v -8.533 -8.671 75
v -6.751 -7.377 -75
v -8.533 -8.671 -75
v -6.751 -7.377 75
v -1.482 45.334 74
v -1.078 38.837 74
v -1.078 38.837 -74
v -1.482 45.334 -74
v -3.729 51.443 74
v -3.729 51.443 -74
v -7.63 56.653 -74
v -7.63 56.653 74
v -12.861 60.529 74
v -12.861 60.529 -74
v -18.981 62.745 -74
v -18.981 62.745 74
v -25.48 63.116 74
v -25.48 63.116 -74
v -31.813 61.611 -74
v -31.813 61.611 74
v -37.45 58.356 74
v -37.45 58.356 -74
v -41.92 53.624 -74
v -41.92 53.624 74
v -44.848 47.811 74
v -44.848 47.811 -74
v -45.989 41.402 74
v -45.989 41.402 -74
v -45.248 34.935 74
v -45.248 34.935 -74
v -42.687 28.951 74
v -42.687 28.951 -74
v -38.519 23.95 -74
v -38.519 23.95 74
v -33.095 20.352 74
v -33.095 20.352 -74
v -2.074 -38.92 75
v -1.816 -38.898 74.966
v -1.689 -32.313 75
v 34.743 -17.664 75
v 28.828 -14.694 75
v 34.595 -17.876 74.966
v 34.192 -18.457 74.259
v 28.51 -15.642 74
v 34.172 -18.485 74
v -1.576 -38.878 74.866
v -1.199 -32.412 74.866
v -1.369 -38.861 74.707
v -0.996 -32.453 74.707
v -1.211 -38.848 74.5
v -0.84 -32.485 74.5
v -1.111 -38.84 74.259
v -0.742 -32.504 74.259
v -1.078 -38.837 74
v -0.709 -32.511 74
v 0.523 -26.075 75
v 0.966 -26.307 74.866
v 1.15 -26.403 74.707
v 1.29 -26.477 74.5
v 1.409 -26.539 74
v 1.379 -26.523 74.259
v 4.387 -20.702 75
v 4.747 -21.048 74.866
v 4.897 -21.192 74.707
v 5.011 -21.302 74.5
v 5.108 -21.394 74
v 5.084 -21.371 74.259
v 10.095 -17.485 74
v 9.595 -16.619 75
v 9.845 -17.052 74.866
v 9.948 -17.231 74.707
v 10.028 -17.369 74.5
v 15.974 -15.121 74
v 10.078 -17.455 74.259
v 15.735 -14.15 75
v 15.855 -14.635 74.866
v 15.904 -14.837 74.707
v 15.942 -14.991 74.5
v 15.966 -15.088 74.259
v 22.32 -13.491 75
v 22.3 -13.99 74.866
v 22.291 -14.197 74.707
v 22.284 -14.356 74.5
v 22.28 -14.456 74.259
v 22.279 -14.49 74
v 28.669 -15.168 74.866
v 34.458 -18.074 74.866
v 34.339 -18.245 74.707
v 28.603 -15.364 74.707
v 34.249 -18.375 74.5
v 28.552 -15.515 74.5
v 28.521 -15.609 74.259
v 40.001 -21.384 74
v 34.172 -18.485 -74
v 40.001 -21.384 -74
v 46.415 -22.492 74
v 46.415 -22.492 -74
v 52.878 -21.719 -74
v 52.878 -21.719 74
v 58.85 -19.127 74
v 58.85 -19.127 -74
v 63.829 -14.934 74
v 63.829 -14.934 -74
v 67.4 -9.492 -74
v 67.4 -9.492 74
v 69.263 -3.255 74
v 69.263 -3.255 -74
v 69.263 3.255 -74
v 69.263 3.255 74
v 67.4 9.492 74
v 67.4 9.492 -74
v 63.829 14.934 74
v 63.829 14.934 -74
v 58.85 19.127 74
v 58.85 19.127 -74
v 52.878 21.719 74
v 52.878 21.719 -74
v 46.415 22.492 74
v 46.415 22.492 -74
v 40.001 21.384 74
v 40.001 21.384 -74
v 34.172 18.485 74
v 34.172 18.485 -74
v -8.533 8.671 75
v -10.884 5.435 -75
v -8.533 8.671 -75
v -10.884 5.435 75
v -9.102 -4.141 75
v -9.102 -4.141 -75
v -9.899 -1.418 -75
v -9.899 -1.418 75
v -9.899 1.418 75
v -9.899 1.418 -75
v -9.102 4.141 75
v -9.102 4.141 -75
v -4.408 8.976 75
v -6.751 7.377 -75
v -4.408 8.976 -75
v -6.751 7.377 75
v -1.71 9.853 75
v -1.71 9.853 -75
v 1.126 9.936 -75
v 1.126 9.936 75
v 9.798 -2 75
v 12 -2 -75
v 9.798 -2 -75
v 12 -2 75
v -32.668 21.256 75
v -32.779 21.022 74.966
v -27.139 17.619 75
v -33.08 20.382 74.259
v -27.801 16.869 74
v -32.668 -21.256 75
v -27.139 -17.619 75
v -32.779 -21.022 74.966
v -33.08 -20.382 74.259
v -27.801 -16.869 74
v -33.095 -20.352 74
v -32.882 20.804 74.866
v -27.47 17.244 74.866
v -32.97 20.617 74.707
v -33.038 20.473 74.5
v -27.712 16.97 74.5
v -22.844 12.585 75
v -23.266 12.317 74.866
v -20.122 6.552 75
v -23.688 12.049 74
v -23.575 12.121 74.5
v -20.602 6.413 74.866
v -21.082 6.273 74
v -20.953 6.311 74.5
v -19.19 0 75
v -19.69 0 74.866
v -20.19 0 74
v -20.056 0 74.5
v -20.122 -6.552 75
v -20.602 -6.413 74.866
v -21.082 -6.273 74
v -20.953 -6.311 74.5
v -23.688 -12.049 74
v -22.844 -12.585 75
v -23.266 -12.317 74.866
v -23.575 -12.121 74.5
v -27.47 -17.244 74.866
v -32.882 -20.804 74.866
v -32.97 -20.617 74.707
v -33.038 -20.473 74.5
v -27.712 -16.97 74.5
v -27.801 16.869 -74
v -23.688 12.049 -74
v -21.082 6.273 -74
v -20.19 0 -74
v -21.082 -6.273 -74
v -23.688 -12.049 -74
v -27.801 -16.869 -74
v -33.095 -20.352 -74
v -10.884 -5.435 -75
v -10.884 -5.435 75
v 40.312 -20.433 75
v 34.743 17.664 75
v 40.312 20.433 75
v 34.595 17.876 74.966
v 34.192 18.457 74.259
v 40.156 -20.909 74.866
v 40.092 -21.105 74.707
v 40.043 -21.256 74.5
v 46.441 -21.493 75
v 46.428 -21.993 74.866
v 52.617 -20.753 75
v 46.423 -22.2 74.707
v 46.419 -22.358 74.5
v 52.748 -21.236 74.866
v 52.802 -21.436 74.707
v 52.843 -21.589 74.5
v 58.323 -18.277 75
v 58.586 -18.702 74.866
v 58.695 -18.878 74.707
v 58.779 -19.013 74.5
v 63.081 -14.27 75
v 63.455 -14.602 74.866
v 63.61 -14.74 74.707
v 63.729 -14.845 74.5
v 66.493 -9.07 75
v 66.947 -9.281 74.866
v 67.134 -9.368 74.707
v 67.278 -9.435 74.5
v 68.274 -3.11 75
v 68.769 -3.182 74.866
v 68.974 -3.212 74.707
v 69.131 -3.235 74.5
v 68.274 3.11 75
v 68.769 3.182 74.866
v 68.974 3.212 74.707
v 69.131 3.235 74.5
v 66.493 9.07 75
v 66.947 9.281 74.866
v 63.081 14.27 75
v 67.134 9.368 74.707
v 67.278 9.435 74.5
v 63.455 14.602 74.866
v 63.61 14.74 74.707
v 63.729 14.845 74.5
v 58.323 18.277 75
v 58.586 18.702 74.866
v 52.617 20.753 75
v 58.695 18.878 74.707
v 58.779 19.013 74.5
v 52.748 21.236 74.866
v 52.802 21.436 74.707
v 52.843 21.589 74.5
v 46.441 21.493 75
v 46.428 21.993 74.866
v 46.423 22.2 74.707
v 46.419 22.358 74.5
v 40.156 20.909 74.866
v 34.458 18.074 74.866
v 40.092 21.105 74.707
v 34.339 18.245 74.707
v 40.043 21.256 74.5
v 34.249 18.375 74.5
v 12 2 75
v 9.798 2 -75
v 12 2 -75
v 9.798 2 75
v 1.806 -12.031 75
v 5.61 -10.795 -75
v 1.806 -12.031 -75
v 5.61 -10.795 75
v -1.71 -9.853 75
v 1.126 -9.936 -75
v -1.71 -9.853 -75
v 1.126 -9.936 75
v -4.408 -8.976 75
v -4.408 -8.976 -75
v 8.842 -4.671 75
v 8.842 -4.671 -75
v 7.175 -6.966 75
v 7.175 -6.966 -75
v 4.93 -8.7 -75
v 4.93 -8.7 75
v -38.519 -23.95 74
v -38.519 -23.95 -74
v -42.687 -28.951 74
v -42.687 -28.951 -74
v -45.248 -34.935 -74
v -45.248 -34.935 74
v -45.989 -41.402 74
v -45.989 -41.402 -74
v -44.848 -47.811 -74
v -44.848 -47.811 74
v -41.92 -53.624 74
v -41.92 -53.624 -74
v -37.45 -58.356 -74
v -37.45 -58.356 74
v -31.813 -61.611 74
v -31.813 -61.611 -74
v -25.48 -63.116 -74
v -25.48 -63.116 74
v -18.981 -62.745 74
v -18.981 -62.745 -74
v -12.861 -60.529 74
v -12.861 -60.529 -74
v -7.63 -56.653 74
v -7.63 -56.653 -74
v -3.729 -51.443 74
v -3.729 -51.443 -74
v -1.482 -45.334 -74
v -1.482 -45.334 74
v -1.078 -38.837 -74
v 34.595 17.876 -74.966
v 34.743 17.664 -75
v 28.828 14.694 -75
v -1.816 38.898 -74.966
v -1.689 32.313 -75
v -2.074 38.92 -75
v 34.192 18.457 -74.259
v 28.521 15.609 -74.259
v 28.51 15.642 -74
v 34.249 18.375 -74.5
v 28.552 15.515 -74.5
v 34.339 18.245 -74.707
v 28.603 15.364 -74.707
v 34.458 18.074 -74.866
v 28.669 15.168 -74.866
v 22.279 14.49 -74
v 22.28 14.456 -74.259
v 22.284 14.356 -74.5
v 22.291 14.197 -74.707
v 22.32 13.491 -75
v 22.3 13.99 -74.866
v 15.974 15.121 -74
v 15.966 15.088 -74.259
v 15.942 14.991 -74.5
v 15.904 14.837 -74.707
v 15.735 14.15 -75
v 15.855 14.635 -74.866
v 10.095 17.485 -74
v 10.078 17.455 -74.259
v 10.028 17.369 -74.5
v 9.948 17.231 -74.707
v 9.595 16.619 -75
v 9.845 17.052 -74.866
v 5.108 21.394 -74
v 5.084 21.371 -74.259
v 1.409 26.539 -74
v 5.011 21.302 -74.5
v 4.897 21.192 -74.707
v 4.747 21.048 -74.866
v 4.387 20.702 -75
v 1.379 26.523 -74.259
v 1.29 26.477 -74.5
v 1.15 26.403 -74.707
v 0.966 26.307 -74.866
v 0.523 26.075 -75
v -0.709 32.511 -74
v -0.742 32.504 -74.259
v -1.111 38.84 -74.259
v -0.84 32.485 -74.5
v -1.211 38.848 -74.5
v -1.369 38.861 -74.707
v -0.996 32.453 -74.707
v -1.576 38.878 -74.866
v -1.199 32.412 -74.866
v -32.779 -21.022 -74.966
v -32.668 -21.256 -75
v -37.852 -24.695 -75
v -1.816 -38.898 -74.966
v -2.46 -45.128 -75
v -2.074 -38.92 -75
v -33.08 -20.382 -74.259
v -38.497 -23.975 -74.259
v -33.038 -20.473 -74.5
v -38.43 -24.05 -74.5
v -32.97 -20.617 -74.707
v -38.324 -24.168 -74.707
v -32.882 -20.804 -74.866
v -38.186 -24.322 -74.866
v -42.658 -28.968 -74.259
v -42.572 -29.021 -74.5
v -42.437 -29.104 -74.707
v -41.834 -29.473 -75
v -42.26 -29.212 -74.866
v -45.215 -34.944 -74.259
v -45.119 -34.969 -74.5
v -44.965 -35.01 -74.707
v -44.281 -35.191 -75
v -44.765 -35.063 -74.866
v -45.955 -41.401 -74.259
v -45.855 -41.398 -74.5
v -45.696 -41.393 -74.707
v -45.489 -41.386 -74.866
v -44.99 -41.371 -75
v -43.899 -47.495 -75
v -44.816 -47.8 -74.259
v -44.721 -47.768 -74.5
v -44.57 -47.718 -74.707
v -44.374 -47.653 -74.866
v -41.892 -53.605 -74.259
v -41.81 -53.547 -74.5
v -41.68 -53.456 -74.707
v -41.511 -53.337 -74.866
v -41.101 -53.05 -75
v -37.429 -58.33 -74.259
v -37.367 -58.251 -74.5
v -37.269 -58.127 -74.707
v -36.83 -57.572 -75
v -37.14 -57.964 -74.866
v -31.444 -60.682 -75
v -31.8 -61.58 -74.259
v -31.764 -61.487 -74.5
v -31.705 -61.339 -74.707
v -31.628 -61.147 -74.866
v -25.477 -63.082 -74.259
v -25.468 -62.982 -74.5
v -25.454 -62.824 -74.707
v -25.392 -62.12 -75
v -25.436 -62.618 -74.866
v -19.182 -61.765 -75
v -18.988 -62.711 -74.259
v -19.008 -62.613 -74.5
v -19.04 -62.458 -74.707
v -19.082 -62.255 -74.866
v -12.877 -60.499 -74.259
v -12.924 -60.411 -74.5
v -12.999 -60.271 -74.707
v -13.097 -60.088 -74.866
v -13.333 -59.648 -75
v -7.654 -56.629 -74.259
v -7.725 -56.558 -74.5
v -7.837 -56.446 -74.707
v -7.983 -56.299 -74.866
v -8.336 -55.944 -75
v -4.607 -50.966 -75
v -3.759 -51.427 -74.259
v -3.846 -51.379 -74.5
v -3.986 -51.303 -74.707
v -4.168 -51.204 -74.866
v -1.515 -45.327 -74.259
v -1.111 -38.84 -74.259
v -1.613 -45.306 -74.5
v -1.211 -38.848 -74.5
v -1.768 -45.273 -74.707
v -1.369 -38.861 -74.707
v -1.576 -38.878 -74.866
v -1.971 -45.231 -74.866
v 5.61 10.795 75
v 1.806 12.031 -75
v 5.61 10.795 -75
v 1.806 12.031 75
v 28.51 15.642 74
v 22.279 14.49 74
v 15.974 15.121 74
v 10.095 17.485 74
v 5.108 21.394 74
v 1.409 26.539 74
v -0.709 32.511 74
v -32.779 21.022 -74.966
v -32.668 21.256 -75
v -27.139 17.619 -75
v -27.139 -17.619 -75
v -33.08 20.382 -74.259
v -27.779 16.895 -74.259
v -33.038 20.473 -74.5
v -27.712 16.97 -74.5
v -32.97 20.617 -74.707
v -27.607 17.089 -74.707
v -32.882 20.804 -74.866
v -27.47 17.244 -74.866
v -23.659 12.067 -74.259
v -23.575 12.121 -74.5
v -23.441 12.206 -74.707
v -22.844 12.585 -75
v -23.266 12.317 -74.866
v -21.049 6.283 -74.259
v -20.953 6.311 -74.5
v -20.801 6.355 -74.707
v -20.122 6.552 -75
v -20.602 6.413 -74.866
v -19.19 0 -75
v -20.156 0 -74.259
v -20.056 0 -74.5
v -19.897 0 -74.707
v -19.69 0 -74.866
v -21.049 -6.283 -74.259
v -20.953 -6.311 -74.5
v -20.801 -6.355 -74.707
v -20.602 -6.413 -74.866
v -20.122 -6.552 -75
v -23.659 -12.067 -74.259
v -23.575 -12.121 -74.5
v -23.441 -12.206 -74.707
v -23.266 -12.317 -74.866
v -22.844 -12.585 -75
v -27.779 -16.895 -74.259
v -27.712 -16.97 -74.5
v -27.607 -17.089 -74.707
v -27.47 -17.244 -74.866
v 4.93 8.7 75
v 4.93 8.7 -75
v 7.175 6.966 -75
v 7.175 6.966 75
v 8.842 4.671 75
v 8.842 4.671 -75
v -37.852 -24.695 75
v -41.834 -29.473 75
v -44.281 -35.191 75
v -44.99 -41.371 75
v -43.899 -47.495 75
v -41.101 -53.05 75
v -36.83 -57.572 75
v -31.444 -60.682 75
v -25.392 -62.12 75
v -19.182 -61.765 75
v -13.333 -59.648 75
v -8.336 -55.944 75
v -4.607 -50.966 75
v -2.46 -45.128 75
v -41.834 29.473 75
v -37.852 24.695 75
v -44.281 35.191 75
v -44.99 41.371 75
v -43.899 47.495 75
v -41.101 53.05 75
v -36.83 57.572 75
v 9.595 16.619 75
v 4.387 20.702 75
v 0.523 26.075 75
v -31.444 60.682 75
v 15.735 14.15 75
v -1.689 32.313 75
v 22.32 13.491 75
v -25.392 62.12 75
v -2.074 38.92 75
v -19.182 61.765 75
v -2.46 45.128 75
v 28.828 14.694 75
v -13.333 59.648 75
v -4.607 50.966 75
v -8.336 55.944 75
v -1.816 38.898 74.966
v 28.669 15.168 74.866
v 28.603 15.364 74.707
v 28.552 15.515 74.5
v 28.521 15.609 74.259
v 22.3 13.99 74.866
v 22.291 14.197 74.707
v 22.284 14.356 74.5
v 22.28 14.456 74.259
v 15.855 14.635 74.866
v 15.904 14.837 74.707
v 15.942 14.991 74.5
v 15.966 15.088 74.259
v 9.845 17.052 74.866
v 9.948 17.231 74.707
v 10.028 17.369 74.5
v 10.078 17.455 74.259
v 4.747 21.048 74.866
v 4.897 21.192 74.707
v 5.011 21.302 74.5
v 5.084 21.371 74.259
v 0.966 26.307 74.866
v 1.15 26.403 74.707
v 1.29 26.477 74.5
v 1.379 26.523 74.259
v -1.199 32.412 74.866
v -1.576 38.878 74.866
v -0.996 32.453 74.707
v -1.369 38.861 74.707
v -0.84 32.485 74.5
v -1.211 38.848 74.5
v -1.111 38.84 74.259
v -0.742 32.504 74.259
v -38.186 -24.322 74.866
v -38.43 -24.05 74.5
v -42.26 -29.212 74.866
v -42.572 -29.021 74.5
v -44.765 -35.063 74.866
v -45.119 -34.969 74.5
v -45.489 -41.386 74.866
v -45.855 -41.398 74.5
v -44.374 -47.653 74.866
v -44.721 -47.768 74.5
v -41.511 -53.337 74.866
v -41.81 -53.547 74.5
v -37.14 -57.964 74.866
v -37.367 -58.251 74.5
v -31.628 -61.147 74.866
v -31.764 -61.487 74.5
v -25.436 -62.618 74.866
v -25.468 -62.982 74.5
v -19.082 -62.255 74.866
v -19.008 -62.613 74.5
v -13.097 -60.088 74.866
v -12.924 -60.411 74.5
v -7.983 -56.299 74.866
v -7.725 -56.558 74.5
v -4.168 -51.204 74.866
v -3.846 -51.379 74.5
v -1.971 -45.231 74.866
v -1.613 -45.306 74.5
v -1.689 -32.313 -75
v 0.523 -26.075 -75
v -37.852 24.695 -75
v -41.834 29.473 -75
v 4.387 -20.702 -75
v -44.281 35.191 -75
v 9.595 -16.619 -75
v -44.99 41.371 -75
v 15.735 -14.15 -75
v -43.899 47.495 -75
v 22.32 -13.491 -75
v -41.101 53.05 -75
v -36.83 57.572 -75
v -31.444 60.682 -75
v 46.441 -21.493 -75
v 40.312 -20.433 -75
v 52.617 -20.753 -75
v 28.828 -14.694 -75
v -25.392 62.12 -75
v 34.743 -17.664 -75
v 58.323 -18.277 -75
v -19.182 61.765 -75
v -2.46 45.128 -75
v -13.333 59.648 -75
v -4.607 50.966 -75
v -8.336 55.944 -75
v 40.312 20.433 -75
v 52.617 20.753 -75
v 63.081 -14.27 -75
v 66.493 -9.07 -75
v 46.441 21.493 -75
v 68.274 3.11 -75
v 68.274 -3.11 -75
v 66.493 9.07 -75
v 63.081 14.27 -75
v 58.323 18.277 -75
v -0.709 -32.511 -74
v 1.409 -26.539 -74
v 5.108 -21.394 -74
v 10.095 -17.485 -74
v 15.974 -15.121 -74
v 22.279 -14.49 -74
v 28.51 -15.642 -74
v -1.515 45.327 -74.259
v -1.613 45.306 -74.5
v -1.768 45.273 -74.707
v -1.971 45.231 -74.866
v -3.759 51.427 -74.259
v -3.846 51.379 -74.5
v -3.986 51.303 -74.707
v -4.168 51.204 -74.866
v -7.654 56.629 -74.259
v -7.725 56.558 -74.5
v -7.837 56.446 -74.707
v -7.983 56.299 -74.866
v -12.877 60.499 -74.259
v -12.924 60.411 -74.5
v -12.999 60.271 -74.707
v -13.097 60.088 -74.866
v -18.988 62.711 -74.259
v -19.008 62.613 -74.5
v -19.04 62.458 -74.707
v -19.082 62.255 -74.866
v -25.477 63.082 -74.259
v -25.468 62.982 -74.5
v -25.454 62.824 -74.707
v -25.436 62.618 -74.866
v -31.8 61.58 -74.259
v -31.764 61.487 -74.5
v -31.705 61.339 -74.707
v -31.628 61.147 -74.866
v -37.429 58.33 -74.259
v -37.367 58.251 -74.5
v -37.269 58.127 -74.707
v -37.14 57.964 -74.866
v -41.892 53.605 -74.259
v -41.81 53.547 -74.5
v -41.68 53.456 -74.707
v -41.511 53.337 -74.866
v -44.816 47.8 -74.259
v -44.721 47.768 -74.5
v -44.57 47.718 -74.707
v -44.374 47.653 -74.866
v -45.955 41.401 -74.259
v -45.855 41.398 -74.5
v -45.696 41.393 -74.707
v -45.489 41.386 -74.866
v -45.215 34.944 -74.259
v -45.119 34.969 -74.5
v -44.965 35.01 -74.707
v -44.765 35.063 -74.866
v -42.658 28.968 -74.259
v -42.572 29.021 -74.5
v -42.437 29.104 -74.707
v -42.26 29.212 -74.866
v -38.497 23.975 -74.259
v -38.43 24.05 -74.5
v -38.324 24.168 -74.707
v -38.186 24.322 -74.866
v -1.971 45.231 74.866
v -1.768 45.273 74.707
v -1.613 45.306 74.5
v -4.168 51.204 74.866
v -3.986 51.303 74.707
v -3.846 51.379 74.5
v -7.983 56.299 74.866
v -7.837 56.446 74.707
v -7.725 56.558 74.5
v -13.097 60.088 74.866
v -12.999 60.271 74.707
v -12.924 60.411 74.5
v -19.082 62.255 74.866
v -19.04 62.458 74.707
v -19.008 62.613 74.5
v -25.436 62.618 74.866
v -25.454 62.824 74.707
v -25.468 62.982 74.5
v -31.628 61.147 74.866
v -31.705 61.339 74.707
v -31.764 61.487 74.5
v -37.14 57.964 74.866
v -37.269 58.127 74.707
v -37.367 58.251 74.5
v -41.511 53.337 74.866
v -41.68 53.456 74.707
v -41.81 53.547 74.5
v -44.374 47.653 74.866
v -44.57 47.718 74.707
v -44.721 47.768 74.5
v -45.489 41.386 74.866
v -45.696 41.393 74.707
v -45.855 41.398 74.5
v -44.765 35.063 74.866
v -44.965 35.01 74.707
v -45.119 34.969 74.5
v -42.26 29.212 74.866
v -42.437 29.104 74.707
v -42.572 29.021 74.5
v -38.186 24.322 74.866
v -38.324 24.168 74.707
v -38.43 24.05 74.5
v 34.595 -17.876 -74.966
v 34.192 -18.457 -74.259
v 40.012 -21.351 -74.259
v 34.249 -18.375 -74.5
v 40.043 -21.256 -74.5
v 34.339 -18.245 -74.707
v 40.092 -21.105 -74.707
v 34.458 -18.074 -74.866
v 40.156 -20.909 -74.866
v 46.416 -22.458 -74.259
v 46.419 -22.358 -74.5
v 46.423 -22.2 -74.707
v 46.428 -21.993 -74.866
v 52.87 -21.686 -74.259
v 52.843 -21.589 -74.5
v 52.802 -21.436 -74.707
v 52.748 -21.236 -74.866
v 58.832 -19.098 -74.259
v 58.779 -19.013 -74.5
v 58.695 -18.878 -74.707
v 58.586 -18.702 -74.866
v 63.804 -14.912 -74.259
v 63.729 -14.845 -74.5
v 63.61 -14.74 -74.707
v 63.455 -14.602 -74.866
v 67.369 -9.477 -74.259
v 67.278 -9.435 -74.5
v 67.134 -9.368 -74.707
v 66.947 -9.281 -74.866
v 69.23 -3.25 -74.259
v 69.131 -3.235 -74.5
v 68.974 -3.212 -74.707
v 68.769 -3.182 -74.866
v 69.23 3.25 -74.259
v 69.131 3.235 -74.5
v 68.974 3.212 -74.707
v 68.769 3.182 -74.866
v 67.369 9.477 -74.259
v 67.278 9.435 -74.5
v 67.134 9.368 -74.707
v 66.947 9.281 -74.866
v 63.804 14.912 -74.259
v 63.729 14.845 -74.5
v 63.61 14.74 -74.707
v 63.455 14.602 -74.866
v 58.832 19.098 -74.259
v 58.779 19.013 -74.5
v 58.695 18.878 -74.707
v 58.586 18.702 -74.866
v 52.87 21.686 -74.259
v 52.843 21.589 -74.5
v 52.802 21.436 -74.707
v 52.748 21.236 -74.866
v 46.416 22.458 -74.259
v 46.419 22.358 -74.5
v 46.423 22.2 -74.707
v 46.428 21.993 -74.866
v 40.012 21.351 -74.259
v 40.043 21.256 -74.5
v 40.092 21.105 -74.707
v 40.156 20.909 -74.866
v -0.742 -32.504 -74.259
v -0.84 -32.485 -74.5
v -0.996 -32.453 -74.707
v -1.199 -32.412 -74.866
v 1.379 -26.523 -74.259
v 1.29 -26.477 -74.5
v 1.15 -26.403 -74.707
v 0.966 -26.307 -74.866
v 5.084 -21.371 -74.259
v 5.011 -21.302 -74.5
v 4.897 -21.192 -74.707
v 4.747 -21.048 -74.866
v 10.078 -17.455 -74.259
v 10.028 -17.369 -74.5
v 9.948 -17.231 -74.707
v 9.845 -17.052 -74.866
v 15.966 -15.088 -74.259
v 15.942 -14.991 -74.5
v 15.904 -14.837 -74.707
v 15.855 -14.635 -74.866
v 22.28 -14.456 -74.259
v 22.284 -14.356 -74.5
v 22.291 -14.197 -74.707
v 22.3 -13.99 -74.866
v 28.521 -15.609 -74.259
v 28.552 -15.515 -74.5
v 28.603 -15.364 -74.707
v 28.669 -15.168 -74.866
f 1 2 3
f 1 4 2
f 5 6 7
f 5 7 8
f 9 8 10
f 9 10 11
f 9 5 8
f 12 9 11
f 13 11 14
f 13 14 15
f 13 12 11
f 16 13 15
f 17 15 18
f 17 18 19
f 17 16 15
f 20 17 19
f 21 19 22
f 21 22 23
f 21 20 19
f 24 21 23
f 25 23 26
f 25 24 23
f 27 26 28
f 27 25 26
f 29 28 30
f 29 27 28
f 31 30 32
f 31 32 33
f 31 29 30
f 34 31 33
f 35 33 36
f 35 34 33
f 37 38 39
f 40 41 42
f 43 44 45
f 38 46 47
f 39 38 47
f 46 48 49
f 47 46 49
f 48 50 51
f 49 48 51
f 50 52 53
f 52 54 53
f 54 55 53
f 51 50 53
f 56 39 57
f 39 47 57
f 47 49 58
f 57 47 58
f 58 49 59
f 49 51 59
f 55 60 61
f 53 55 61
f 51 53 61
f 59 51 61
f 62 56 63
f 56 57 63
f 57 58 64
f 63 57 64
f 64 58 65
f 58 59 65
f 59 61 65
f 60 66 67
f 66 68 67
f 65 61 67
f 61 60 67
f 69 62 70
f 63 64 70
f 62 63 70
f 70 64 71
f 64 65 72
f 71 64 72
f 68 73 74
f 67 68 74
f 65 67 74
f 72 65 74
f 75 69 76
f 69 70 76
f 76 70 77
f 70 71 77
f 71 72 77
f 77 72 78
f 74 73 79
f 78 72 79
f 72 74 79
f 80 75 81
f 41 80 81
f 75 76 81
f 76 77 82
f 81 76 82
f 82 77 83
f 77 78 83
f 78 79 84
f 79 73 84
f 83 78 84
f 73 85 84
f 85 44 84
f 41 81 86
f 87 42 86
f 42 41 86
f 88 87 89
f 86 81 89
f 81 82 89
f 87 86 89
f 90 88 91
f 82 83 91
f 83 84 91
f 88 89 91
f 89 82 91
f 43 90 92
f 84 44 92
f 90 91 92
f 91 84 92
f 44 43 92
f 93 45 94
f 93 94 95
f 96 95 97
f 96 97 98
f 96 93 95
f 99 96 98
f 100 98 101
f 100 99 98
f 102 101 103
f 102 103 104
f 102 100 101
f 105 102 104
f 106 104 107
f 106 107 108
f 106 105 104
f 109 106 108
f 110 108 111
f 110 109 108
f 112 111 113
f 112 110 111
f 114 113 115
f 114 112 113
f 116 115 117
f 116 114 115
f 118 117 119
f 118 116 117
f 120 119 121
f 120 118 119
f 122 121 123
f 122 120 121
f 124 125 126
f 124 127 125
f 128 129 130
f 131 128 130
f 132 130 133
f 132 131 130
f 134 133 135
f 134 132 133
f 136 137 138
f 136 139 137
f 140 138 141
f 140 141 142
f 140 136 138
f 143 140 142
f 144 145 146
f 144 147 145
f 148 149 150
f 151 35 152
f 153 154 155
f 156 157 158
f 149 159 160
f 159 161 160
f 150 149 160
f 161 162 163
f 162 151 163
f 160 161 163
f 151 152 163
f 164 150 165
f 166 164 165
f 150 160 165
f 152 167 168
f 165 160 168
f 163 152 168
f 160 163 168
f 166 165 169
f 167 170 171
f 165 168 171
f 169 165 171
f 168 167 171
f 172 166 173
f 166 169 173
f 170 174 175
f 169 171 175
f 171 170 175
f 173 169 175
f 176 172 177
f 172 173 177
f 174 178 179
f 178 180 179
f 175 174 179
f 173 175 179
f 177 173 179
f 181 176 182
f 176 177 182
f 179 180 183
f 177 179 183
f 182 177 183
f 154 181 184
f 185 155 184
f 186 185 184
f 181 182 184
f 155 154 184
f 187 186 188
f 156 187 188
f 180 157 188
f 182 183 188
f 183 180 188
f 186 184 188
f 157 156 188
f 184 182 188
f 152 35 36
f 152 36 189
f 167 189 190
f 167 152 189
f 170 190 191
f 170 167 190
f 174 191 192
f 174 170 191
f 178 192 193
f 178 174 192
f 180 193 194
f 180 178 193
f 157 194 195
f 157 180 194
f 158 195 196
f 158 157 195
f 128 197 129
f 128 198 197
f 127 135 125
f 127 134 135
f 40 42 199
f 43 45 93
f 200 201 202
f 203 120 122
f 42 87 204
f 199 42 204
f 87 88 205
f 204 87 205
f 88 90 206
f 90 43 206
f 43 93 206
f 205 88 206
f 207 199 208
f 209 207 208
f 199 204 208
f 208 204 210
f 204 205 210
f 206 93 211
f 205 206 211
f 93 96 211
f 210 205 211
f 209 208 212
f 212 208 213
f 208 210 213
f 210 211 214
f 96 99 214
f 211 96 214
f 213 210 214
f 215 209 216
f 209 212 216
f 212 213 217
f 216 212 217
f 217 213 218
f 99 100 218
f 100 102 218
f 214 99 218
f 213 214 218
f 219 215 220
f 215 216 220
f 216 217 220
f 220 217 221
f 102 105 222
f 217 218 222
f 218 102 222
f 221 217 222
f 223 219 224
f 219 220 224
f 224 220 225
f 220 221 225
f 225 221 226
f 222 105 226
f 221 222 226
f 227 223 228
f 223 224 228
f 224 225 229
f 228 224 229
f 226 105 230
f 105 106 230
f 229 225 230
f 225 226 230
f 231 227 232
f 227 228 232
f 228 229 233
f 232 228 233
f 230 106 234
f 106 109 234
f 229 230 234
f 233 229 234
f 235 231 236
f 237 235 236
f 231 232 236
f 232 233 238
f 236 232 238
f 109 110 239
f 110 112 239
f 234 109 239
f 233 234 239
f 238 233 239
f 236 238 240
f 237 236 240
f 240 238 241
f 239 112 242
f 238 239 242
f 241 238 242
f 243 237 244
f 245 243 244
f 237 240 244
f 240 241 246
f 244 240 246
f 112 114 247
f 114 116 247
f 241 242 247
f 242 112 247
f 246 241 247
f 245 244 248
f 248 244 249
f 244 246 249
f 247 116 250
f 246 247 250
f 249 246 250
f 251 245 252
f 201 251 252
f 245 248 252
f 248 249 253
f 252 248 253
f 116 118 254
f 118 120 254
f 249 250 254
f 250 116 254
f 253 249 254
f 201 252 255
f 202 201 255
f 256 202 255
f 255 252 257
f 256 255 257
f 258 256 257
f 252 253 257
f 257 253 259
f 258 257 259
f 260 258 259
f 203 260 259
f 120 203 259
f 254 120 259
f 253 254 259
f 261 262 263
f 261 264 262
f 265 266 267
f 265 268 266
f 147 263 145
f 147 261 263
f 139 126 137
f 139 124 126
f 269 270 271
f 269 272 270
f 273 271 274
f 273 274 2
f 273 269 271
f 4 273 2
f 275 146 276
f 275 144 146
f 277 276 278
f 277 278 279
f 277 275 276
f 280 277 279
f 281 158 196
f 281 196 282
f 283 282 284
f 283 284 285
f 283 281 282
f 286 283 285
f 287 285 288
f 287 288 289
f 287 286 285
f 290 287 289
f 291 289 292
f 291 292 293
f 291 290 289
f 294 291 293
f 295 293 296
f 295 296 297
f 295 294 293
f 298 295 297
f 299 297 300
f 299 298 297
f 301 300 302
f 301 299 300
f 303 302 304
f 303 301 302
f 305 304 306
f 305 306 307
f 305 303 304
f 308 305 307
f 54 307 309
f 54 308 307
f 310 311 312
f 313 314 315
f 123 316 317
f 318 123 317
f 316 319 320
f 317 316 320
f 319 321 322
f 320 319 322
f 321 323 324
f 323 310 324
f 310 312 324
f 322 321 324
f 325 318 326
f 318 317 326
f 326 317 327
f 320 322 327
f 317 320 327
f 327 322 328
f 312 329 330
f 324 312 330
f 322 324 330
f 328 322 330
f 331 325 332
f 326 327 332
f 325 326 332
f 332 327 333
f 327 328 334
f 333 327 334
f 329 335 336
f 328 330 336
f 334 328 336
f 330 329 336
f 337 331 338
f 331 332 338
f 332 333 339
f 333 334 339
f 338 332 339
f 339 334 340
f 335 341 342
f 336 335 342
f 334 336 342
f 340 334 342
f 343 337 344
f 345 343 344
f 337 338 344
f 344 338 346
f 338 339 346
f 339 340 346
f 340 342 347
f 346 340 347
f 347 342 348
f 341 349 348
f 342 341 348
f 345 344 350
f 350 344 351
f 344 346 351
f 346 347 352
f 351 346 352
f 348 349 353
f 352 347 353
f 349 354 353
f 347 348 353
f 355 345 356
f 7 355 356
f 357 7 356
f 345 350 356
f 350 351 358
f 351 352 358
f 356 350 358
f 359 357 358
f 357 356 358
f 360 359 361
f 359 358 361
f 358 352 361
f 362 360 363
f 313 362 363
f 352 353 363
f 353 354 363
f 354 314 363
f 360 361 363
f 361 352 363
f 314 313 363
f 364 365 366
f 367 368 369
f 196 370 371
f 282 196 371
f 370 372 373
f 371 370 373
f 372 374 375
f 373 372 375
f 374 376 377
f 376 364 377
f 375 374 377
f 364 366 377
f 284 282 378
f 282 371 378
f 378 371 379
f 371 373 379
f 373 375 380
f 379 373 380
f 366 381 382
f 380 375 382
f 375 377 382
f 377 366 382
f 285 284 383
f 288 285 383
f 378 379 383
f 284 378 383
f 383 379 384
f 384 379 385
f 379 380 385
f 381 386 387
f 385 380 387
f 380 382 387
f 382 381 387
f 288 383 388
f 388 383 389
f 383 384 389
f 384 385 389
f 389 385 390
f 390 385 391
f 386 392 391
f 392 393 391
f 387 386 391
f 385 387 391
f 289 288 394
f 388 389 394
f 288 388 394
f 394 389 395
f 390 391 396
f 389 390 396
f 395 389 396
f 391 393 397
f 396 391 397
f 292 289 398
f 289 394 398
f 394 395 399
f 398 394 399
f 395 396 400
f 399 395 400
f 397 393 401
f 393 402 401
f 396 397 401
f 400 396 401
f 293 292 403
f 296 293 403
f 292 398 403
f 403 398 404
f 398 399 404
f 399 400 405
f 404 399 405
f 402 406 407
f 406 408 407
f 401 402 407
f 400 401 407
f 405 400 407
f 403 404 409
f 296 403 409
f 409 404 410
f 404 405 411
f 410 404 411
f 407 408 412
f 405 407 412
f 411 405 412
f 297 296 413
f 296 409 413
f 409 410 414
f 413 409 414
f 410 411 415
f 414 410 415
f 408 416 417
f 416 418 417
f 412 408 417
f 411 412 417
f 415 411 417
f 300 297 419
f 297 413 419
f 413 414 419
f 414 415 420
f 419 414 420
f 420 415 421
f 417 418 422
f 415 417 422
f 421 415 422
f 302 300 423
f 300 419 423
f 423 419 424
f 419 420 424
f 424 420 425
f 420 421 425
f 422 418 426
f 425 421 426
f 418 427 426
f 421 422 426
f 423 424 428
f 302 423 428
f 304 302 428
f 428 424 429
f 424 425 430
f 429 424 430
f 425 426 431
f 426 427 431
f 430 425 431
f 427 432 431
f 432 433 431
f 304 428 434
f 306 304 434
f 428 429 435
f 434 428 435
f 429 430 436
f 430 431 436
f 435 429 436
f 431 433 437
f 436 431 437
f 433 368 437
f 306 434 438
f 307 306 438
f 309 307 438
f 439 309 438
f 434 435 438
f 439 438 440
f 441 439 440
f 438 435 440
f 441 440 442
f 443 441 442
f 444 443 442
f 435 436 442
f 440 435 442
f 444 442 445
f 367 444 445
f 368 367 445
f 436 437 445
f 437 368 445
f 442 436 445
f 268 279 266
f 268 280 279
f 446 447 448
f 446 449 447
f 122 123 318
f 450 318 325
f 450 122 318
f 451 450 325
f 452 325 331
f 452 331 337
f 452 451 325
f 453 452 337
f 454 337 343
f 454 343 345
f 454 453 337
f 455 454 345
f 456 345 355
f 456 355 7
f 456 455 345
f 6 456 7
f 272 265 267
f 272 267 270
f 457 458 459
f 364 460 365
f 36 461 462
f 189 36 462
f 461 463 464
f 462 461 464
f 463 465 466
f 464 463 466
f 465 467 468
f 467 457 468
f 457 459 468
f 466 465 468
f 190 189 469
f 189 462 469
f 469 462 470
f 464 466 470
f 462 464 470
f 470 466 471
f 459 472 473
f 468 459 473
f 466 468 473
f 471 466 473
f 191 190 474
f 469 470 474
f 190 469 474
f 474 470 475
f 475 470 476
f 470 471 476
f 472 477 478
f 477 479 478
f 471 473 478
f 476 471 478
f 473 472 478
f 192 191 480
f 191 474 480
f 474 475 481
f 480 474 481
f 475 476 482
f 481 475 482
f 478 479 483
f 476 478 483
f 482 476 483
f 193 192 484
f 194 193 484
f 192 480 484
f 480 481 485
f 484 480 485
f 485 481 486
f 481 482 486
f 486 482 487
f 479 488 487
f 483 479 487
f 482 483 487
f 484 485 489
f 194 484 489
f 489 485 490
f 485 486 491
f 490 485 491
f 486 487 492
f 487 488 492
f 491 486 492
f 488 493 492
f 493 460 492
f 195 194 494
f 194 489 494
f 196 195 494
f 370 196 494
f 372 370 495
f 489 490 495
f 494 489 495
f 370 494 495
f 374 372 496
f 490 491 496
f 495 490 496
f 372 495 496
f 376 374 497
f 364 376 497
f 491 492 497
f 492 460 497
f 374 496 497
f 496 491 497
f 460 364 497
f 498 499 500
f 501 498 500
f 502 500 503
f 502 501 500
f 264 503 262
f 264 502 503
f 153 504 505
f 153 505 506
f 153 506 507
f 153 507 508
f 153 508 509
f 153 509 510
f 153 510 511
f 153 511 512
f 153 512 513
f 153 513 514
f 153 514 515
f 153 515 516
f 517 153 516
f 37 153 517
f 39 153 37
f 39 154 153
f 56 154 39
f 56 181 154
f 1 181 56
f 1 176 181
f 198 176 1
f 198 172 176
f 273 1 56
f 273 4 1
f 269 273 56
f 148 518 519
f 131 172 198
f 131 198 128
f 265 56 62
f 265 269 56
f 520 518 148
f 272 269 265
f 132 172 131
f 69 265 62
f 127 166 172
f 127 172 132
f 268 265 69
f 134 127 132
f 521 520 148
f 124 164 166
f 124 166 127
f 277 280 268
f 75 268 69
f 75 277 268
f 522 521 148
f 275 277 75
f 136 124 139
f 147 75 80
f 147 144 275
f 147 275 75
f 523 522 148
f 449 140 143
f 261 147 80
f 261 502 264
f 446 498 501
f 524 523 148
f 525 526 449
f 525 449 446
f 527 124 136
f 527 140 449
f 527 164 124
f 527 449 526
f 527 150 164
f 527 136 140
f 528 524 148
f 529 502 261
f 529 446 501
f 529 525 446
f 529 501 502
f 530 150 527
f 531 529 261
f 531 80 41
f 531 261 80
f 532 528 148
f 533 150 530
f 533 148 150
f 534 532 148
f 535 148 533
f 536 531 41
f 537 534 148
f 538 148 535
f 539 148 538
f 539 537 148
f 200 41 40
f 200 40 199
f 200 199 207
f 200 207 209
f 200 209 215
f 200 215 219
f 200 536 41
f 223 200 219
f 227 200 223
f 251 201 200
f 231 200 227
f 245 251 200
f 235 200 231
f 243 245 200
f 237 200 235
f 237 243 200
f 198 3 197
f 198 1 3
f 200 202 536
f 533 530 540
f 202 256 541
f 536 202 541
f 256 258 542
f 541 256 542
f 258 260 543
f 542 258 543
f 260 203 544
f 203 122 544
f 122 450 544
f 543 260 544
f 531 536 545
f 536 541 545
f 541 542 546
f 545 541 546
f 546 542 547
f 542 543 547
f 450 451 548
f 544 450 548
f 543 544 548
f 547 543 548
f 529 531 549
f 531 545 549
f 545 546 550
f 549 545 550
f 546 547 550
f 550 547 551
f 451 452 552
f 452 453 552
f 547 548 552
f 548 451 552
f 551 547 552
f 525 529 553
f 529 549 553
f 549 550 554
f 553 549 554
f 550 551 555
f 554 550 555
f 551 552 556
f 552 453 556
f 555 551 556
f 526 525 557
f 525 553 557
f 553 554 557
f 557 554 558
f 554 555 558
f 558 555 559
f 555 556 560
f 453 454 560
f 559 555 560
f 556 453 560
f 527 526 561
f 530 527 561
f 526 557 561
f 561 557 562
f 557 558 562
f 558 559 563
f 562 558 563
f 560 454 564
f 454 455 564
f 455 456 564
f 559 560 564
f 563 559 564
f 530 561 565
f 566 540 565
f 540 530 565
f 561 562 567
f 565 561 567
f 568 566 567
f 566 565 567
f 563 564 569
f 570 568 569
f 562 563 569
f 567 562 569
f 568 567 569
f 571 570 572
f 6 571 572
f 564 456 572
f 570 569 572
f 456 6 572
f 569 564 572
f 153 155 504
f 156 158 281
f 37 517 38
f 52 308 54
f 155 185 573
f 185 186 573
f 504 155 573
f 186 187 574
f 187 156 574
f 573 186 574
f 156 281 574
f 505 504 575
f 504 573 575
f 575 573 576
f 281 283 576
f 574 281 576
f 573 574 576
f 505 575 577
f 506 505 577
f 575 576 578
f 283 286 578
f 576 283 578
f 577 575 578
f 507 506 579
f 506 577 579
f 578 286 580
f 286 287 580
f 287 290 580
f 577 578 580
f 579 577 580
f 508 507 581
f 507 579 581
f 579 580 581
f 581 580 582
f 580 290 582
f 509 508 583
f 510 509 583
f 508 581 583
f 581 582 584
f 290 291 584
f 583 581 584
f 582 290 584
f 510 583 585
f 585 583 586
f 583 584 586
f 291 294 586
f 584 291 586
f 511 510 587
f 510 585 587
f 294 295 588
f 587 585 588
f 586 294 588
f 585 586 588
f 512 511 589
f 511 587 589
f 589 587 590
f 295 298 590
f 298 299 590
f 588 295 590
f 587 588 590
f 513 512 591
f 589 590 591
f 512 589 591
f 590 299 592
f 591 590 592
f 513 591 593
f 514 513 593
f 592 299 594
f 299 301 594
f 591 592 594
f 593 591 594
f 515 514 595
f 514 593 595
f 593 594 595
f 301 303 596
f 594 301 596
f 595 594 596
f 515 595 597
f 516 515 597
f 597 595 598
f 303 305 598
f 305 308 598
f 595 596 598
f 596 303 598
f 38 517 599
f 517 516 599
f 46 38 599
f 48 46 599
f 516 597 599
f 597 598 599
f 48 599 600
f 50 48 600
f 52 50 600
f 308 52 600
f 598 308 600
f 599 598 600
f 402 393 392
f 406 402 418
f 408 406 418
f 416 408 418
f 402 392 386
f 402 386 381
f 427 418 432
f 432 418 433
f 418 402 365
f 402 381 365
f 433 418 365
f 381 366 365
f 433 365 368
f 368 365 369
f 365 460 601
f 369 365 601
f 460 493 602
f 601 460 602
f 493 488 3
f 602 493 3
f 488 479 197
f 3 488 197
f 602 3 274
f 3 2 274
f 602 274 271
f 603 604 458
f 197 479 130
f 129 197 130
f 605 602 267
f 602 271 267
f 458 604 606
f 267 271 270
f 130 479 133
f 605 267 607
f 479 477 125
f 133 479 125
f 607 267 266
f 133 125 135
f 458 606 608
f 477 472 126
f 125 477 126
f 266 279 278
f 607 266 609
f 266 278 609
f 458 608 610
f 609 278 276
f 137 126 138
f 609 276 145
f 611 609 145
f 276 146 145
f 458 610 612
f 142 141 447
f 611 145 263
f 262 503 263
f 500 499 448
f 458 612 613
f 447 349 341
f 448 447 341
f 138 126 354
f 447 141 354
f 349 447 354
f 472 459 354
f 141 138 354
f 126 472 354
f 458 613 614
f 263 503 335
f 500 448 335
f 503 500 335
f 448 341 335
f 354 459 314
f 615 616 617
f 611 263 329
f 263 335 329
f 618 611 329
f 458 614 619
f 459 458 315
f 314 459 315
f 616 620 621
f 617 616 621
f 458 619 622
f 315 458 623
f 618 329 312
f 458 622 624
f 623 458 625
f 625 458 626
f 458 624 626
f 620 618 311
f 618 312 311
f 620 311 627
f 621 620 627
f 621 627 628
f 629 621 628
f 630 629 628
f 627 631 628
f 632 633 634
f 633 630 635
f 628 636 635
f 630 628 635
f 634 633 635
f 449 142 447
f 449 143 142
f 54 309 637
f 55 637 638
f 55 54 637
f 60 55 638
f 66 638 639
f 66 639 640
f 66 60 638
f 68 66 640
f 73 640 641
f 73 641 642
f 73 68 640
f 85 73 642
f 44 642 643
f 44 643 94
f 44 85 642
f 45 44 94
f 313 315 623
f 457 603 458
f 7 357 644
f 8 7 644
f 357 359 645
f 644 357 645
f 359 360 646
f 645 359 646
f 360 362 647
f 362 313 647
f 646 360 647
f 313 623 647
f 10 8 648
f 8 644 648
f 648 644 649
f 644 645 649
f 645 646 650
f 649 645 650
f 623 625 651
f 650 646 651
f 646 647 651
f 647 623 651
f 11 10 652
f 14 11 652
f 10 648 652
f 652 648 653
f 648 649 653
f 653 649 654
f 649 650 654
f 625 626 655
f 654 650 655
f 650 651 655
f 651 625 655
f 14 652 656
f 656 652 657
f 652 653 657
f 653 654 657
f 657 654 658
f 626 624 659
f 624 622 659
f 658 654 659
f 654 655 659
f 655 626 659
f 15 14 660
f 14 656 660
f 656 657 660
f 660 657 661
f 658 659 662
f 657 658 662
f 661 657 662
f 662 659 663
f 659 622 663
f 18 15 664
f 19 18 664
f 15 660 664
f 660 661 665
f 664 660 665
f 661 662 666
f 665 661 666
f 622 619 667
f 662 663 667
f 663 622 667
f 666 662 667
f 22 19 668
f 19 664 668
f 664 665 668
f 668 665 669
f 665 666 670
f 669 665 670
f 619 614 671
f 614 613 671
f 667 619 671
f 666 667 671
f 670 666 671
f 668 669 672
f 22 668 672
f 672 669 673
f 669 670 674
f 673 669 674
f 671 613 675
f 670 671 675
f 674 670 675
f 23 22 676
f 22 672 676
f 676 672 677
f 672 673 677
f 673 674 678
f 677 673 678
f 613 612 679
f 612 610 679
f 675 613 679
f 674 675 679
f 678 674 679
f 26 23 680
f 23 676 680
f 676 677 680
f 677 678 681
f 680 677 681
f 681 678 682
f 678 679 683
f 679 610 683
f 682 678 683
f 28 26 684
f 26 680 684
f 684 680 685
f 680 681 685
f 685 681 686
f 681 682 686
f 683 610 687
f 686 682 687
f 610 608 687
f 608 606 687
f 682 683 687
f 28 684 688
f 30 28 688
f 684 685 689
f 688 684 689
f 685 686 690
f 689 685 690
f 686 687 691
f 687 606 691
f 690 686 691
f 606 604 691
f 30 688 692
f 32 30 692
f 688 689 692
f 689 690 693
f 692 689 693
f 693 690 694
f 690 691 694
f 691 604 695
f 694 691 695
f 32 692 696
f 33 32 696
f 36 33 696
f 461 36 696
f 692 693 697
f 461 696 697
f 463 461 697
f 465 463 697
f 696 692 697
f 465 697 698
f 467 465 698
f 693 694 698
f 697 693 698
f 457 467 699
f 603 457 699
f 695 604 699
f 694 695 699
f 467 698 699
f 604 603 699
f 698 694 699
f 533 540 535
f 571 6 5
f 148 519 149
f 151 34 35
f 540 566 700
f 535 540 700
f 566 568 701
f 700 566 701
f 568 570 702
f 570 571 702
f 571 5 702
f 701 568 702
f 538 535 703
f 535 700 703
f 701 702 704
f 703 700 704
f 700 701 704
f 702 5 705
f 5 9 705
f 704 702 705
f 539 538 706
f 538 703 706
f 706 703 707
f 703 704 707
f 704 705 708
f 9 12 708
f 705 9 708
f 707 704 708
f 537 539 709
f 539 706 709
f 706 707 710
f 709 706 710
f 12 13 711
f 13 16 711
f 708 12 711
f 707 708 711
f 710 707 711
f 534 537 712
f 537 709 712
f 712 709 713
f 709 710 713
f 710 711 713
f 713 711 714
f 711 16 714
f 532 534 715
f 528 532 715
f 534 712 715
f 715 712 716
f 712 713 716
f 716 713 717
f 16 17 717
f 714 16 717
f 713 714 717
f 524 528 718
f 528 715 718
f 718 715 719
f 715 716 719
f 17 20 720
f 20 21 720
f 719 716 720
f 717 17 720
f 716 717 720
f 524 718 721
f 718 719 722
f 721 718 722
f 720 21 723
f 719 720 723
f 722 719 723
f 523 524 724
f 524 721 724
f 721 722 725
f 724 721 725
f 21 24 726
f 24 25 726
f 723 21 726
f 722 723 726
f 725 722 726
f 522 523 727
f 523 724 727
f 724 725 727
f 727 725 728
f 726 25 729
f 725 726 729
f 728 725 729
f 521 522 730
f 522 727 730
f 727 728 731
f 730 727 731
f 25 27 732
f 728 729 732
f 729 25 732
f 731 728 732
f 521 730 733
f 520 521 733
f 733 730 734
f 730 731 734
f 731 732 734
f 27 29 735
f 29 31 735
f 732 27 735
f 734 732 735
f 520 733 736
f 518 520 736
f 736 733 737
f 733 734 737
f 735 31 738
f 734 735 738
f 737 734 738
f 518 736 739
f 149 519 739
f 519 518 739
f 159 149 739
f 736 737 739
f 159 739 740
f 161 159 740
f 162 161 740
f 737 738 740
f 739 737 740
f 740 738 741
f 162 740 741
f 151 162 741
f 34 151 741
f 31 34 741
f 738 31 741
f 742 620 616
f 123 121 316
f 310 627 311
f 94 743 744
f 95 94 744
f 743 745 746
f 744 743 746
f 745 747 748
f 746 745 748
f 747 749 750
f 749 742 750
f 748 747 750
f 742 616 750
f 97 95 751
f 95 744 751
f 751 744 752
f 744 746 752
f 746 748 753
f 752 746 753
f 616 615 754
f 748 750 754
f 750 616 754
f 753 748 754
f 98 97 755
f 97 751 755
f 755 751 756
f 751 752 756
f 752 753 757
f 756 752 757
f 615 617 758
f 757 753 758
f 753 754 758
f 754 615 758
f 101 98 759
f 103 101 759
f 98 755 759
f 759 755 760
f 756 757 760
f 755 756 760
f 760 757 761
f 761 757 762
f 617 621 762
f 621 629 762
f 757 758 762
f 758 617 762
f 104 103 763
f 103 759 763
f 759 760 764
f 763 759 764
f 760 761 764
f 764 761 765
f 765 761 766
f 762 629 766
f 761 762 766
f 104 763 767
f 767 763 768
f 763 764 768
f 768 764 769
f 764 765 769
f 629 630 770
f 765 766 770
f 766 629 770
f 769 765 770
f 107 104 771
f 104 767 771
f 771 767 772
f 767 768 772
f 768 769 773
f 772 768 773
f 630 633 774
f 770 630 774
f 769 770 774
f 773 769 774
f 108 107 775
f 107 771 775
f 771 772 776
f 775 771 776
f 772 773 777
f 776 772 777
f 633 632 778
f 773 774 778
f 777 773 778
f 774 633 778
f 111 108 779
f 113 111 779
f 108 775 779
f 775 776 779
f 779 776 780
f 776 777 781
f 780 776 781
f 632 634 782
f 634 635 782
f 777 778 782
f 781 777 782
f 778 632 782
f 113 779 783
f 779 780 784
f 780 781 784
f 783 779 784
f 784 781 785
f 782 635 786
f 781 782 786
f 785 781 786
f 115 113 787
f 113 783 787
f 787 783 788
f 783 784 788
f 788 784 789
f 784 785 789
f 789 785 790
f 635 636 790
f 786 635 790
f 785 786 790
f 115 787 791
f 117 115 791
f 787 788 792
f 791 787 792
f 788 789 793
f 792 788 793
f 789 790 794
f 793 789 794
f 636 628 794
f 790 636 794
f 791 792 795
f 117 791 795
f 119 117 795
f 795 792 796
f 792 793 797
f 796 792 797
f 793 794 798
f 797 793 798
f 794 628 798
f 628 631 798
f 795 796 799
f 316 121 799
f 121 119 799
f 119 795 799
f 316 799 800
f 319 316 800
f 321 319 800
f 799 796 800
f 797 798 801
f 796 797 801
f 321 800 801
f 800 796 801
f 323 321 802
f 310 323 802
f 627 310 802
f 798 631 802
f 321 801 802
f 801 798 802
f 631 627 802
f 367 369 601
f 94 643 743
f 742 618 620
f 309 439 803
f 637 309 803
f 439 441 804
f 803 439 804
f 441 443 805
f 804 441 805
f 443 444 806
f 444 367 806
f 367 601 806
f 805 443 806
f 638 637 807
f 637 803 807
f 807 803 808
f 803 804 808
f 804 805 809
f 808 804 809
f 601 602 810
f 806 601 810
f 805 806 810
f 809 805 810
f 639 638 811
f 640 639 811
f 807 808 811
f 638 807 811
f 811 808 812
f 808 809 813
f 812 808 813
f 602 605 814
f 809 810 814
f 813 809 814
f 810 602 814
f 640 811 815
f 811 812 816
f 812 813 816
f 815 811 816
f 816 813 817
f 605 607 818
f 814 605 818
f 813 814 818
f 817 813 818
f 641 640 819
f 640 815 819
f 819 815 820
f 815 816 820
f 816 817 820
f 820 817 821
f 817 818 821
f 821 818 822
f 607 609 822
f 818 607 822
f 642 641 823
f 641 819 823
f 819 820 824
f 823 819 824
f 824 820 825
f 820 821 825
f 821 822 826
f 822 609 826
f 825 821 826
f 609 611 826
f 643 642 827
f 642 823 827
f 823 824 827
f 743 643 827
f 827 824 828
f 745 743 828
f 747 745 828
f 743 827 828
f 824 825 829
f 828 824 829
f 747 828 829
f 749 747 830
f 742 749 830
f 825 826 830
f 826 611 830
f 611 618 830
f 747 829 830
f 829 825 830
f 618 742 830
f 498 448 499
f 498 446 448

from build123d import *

# Parameters (mm, degrees)
SKETCH1_R           = 22.5
BOSS_EXTRUDE1_DEPTH = 75
FILLET1_R           = 1


with BuildPart() as part:
    # Sketch1 → Boss-Extrude1 (new body, symmetric)
    with BuildSketch(Plane.XY):
        with Locations((-23.5, 40.703193978)):
            Circle(SKETCH1_R)
        with Locations((47, 0)):
            Circle(SKETCH1_R)
        with Locations((-23.5, -40.703193978)):
            Circle(SKETCH1_R)
        with BuildLine():
            ThreePointArc((34.172460266, -18.485243422), (24.5, 0), (34.172460266, 18.485243422))
            ThreePointArc((34.172460266, 18.485243422), (10.094920531, 17.484915258), (-1.077539734, 38.836840411))
            ThreePointArc((-1.077539734, 38.836840411), (-12.25, 21.217622393), (-33.094920531, 20.351596989))
            ThreePointArc((-33.094920531, 20.351596989), (-20.189841062, 0), (-33.094920531, -20.351596989))
            ThreePointArc((-33.094920531, -20.351596989), (-12.25, -21.217622393), (-1.077539734, -38.836840411))
            ThreePointArc((-1.077539734, -38.836840411), (10.094920531, -17.484915258), (34.172460266, -18.485243422))
        make_face()
        with BuildLine():
            Line((1.8060909, -12.030712184), (1.1256228, -9.936446715))
            ThreePointArc((1.1256228, -9.936446715), (-3.090169944, -9.510565163), (-6.751144813, -7.377129775))
            Line((-6.751144813, -7.377129775), (-8.532633428, -8.671457016))
            Line((-8.532633428, -8.671457016), (-10.883774437, -5.435389039))
            Line((-10.883774437, -5.435389039), (-9.102285822, -4.141061797))
            ThreePointArc((-9.102285822, -4.141061797), (-10, 0), (-9.102285822, 4.141061797))
            Line((-9.102285822, 4.141061797), (-10.883774437, 5.435389039))
            Line((-10.883774437, 5.435389039), (-8.532633428, 8.671457016))
            Line((-8.532633428, 8.671457016), (-6.751144813, 7.377129775))
            ThreePointArc((-6.751144813, 7.377129775), (-3.090169944, 9.510565163), (1.1256228, 9.936446715))
            Line((1.1256228, 9.936446715), (1.8060909, 12.030712184))
            Line((1.8060909, 12.030712184), (5.610316965, 10.794644207))
            Line((5.610316965, 10.794644207), (4.929848865, 8.700378737))
            ThreePointArc((4.929848865, 8.700378737), (8.090169944, 5.877852523), (9.797958971, 2))
            Line((9.797958971, 2), (12, 2))
            Line((12, 2), (12, -2))
            Line((12, -2), (9.797958971, -2))
            ThreePointArc((9.797958971, -2), (8.090169944, -5.877852523), (4.929848865, -8.700378737))
            Line((4.929848865, -8.700378737), (5.610316965, -10.794644207))
            Line((5.610316965, -10.794644207), (1.8060909, -12.030712184))
        make_face(mode=Mode.SUBTRACT)
    extrude(amount=BOSS_EXTRUDE1_DEPTH, both=True)

    # Fillet1
    fillet1_edges = [part.edges().sort_by_distance(p)[0] for p in [
        (-34.75, -60.188765563, 75),
        (10.094920531, -17.484915258, 75),
        (69.5, 0, 75),
        (10.094920531, 17.484915258, 75),
        (10.094920531, 17.484915258, -75),
        (69.5, 0, -75),
        (10.094920531, -17.484915258, -75),
        (-34.75, -60.188765563, -75),
        (-20.189841062, 0, -75),
        (-34.75, 60.188765563, -75),
        (-34.75, 60.188765563, 75),
        (-20.189841062, 0, 75),
    ]]
    fillet(fillet1_edges, radius=FILLET1_R)


solid = part.part
